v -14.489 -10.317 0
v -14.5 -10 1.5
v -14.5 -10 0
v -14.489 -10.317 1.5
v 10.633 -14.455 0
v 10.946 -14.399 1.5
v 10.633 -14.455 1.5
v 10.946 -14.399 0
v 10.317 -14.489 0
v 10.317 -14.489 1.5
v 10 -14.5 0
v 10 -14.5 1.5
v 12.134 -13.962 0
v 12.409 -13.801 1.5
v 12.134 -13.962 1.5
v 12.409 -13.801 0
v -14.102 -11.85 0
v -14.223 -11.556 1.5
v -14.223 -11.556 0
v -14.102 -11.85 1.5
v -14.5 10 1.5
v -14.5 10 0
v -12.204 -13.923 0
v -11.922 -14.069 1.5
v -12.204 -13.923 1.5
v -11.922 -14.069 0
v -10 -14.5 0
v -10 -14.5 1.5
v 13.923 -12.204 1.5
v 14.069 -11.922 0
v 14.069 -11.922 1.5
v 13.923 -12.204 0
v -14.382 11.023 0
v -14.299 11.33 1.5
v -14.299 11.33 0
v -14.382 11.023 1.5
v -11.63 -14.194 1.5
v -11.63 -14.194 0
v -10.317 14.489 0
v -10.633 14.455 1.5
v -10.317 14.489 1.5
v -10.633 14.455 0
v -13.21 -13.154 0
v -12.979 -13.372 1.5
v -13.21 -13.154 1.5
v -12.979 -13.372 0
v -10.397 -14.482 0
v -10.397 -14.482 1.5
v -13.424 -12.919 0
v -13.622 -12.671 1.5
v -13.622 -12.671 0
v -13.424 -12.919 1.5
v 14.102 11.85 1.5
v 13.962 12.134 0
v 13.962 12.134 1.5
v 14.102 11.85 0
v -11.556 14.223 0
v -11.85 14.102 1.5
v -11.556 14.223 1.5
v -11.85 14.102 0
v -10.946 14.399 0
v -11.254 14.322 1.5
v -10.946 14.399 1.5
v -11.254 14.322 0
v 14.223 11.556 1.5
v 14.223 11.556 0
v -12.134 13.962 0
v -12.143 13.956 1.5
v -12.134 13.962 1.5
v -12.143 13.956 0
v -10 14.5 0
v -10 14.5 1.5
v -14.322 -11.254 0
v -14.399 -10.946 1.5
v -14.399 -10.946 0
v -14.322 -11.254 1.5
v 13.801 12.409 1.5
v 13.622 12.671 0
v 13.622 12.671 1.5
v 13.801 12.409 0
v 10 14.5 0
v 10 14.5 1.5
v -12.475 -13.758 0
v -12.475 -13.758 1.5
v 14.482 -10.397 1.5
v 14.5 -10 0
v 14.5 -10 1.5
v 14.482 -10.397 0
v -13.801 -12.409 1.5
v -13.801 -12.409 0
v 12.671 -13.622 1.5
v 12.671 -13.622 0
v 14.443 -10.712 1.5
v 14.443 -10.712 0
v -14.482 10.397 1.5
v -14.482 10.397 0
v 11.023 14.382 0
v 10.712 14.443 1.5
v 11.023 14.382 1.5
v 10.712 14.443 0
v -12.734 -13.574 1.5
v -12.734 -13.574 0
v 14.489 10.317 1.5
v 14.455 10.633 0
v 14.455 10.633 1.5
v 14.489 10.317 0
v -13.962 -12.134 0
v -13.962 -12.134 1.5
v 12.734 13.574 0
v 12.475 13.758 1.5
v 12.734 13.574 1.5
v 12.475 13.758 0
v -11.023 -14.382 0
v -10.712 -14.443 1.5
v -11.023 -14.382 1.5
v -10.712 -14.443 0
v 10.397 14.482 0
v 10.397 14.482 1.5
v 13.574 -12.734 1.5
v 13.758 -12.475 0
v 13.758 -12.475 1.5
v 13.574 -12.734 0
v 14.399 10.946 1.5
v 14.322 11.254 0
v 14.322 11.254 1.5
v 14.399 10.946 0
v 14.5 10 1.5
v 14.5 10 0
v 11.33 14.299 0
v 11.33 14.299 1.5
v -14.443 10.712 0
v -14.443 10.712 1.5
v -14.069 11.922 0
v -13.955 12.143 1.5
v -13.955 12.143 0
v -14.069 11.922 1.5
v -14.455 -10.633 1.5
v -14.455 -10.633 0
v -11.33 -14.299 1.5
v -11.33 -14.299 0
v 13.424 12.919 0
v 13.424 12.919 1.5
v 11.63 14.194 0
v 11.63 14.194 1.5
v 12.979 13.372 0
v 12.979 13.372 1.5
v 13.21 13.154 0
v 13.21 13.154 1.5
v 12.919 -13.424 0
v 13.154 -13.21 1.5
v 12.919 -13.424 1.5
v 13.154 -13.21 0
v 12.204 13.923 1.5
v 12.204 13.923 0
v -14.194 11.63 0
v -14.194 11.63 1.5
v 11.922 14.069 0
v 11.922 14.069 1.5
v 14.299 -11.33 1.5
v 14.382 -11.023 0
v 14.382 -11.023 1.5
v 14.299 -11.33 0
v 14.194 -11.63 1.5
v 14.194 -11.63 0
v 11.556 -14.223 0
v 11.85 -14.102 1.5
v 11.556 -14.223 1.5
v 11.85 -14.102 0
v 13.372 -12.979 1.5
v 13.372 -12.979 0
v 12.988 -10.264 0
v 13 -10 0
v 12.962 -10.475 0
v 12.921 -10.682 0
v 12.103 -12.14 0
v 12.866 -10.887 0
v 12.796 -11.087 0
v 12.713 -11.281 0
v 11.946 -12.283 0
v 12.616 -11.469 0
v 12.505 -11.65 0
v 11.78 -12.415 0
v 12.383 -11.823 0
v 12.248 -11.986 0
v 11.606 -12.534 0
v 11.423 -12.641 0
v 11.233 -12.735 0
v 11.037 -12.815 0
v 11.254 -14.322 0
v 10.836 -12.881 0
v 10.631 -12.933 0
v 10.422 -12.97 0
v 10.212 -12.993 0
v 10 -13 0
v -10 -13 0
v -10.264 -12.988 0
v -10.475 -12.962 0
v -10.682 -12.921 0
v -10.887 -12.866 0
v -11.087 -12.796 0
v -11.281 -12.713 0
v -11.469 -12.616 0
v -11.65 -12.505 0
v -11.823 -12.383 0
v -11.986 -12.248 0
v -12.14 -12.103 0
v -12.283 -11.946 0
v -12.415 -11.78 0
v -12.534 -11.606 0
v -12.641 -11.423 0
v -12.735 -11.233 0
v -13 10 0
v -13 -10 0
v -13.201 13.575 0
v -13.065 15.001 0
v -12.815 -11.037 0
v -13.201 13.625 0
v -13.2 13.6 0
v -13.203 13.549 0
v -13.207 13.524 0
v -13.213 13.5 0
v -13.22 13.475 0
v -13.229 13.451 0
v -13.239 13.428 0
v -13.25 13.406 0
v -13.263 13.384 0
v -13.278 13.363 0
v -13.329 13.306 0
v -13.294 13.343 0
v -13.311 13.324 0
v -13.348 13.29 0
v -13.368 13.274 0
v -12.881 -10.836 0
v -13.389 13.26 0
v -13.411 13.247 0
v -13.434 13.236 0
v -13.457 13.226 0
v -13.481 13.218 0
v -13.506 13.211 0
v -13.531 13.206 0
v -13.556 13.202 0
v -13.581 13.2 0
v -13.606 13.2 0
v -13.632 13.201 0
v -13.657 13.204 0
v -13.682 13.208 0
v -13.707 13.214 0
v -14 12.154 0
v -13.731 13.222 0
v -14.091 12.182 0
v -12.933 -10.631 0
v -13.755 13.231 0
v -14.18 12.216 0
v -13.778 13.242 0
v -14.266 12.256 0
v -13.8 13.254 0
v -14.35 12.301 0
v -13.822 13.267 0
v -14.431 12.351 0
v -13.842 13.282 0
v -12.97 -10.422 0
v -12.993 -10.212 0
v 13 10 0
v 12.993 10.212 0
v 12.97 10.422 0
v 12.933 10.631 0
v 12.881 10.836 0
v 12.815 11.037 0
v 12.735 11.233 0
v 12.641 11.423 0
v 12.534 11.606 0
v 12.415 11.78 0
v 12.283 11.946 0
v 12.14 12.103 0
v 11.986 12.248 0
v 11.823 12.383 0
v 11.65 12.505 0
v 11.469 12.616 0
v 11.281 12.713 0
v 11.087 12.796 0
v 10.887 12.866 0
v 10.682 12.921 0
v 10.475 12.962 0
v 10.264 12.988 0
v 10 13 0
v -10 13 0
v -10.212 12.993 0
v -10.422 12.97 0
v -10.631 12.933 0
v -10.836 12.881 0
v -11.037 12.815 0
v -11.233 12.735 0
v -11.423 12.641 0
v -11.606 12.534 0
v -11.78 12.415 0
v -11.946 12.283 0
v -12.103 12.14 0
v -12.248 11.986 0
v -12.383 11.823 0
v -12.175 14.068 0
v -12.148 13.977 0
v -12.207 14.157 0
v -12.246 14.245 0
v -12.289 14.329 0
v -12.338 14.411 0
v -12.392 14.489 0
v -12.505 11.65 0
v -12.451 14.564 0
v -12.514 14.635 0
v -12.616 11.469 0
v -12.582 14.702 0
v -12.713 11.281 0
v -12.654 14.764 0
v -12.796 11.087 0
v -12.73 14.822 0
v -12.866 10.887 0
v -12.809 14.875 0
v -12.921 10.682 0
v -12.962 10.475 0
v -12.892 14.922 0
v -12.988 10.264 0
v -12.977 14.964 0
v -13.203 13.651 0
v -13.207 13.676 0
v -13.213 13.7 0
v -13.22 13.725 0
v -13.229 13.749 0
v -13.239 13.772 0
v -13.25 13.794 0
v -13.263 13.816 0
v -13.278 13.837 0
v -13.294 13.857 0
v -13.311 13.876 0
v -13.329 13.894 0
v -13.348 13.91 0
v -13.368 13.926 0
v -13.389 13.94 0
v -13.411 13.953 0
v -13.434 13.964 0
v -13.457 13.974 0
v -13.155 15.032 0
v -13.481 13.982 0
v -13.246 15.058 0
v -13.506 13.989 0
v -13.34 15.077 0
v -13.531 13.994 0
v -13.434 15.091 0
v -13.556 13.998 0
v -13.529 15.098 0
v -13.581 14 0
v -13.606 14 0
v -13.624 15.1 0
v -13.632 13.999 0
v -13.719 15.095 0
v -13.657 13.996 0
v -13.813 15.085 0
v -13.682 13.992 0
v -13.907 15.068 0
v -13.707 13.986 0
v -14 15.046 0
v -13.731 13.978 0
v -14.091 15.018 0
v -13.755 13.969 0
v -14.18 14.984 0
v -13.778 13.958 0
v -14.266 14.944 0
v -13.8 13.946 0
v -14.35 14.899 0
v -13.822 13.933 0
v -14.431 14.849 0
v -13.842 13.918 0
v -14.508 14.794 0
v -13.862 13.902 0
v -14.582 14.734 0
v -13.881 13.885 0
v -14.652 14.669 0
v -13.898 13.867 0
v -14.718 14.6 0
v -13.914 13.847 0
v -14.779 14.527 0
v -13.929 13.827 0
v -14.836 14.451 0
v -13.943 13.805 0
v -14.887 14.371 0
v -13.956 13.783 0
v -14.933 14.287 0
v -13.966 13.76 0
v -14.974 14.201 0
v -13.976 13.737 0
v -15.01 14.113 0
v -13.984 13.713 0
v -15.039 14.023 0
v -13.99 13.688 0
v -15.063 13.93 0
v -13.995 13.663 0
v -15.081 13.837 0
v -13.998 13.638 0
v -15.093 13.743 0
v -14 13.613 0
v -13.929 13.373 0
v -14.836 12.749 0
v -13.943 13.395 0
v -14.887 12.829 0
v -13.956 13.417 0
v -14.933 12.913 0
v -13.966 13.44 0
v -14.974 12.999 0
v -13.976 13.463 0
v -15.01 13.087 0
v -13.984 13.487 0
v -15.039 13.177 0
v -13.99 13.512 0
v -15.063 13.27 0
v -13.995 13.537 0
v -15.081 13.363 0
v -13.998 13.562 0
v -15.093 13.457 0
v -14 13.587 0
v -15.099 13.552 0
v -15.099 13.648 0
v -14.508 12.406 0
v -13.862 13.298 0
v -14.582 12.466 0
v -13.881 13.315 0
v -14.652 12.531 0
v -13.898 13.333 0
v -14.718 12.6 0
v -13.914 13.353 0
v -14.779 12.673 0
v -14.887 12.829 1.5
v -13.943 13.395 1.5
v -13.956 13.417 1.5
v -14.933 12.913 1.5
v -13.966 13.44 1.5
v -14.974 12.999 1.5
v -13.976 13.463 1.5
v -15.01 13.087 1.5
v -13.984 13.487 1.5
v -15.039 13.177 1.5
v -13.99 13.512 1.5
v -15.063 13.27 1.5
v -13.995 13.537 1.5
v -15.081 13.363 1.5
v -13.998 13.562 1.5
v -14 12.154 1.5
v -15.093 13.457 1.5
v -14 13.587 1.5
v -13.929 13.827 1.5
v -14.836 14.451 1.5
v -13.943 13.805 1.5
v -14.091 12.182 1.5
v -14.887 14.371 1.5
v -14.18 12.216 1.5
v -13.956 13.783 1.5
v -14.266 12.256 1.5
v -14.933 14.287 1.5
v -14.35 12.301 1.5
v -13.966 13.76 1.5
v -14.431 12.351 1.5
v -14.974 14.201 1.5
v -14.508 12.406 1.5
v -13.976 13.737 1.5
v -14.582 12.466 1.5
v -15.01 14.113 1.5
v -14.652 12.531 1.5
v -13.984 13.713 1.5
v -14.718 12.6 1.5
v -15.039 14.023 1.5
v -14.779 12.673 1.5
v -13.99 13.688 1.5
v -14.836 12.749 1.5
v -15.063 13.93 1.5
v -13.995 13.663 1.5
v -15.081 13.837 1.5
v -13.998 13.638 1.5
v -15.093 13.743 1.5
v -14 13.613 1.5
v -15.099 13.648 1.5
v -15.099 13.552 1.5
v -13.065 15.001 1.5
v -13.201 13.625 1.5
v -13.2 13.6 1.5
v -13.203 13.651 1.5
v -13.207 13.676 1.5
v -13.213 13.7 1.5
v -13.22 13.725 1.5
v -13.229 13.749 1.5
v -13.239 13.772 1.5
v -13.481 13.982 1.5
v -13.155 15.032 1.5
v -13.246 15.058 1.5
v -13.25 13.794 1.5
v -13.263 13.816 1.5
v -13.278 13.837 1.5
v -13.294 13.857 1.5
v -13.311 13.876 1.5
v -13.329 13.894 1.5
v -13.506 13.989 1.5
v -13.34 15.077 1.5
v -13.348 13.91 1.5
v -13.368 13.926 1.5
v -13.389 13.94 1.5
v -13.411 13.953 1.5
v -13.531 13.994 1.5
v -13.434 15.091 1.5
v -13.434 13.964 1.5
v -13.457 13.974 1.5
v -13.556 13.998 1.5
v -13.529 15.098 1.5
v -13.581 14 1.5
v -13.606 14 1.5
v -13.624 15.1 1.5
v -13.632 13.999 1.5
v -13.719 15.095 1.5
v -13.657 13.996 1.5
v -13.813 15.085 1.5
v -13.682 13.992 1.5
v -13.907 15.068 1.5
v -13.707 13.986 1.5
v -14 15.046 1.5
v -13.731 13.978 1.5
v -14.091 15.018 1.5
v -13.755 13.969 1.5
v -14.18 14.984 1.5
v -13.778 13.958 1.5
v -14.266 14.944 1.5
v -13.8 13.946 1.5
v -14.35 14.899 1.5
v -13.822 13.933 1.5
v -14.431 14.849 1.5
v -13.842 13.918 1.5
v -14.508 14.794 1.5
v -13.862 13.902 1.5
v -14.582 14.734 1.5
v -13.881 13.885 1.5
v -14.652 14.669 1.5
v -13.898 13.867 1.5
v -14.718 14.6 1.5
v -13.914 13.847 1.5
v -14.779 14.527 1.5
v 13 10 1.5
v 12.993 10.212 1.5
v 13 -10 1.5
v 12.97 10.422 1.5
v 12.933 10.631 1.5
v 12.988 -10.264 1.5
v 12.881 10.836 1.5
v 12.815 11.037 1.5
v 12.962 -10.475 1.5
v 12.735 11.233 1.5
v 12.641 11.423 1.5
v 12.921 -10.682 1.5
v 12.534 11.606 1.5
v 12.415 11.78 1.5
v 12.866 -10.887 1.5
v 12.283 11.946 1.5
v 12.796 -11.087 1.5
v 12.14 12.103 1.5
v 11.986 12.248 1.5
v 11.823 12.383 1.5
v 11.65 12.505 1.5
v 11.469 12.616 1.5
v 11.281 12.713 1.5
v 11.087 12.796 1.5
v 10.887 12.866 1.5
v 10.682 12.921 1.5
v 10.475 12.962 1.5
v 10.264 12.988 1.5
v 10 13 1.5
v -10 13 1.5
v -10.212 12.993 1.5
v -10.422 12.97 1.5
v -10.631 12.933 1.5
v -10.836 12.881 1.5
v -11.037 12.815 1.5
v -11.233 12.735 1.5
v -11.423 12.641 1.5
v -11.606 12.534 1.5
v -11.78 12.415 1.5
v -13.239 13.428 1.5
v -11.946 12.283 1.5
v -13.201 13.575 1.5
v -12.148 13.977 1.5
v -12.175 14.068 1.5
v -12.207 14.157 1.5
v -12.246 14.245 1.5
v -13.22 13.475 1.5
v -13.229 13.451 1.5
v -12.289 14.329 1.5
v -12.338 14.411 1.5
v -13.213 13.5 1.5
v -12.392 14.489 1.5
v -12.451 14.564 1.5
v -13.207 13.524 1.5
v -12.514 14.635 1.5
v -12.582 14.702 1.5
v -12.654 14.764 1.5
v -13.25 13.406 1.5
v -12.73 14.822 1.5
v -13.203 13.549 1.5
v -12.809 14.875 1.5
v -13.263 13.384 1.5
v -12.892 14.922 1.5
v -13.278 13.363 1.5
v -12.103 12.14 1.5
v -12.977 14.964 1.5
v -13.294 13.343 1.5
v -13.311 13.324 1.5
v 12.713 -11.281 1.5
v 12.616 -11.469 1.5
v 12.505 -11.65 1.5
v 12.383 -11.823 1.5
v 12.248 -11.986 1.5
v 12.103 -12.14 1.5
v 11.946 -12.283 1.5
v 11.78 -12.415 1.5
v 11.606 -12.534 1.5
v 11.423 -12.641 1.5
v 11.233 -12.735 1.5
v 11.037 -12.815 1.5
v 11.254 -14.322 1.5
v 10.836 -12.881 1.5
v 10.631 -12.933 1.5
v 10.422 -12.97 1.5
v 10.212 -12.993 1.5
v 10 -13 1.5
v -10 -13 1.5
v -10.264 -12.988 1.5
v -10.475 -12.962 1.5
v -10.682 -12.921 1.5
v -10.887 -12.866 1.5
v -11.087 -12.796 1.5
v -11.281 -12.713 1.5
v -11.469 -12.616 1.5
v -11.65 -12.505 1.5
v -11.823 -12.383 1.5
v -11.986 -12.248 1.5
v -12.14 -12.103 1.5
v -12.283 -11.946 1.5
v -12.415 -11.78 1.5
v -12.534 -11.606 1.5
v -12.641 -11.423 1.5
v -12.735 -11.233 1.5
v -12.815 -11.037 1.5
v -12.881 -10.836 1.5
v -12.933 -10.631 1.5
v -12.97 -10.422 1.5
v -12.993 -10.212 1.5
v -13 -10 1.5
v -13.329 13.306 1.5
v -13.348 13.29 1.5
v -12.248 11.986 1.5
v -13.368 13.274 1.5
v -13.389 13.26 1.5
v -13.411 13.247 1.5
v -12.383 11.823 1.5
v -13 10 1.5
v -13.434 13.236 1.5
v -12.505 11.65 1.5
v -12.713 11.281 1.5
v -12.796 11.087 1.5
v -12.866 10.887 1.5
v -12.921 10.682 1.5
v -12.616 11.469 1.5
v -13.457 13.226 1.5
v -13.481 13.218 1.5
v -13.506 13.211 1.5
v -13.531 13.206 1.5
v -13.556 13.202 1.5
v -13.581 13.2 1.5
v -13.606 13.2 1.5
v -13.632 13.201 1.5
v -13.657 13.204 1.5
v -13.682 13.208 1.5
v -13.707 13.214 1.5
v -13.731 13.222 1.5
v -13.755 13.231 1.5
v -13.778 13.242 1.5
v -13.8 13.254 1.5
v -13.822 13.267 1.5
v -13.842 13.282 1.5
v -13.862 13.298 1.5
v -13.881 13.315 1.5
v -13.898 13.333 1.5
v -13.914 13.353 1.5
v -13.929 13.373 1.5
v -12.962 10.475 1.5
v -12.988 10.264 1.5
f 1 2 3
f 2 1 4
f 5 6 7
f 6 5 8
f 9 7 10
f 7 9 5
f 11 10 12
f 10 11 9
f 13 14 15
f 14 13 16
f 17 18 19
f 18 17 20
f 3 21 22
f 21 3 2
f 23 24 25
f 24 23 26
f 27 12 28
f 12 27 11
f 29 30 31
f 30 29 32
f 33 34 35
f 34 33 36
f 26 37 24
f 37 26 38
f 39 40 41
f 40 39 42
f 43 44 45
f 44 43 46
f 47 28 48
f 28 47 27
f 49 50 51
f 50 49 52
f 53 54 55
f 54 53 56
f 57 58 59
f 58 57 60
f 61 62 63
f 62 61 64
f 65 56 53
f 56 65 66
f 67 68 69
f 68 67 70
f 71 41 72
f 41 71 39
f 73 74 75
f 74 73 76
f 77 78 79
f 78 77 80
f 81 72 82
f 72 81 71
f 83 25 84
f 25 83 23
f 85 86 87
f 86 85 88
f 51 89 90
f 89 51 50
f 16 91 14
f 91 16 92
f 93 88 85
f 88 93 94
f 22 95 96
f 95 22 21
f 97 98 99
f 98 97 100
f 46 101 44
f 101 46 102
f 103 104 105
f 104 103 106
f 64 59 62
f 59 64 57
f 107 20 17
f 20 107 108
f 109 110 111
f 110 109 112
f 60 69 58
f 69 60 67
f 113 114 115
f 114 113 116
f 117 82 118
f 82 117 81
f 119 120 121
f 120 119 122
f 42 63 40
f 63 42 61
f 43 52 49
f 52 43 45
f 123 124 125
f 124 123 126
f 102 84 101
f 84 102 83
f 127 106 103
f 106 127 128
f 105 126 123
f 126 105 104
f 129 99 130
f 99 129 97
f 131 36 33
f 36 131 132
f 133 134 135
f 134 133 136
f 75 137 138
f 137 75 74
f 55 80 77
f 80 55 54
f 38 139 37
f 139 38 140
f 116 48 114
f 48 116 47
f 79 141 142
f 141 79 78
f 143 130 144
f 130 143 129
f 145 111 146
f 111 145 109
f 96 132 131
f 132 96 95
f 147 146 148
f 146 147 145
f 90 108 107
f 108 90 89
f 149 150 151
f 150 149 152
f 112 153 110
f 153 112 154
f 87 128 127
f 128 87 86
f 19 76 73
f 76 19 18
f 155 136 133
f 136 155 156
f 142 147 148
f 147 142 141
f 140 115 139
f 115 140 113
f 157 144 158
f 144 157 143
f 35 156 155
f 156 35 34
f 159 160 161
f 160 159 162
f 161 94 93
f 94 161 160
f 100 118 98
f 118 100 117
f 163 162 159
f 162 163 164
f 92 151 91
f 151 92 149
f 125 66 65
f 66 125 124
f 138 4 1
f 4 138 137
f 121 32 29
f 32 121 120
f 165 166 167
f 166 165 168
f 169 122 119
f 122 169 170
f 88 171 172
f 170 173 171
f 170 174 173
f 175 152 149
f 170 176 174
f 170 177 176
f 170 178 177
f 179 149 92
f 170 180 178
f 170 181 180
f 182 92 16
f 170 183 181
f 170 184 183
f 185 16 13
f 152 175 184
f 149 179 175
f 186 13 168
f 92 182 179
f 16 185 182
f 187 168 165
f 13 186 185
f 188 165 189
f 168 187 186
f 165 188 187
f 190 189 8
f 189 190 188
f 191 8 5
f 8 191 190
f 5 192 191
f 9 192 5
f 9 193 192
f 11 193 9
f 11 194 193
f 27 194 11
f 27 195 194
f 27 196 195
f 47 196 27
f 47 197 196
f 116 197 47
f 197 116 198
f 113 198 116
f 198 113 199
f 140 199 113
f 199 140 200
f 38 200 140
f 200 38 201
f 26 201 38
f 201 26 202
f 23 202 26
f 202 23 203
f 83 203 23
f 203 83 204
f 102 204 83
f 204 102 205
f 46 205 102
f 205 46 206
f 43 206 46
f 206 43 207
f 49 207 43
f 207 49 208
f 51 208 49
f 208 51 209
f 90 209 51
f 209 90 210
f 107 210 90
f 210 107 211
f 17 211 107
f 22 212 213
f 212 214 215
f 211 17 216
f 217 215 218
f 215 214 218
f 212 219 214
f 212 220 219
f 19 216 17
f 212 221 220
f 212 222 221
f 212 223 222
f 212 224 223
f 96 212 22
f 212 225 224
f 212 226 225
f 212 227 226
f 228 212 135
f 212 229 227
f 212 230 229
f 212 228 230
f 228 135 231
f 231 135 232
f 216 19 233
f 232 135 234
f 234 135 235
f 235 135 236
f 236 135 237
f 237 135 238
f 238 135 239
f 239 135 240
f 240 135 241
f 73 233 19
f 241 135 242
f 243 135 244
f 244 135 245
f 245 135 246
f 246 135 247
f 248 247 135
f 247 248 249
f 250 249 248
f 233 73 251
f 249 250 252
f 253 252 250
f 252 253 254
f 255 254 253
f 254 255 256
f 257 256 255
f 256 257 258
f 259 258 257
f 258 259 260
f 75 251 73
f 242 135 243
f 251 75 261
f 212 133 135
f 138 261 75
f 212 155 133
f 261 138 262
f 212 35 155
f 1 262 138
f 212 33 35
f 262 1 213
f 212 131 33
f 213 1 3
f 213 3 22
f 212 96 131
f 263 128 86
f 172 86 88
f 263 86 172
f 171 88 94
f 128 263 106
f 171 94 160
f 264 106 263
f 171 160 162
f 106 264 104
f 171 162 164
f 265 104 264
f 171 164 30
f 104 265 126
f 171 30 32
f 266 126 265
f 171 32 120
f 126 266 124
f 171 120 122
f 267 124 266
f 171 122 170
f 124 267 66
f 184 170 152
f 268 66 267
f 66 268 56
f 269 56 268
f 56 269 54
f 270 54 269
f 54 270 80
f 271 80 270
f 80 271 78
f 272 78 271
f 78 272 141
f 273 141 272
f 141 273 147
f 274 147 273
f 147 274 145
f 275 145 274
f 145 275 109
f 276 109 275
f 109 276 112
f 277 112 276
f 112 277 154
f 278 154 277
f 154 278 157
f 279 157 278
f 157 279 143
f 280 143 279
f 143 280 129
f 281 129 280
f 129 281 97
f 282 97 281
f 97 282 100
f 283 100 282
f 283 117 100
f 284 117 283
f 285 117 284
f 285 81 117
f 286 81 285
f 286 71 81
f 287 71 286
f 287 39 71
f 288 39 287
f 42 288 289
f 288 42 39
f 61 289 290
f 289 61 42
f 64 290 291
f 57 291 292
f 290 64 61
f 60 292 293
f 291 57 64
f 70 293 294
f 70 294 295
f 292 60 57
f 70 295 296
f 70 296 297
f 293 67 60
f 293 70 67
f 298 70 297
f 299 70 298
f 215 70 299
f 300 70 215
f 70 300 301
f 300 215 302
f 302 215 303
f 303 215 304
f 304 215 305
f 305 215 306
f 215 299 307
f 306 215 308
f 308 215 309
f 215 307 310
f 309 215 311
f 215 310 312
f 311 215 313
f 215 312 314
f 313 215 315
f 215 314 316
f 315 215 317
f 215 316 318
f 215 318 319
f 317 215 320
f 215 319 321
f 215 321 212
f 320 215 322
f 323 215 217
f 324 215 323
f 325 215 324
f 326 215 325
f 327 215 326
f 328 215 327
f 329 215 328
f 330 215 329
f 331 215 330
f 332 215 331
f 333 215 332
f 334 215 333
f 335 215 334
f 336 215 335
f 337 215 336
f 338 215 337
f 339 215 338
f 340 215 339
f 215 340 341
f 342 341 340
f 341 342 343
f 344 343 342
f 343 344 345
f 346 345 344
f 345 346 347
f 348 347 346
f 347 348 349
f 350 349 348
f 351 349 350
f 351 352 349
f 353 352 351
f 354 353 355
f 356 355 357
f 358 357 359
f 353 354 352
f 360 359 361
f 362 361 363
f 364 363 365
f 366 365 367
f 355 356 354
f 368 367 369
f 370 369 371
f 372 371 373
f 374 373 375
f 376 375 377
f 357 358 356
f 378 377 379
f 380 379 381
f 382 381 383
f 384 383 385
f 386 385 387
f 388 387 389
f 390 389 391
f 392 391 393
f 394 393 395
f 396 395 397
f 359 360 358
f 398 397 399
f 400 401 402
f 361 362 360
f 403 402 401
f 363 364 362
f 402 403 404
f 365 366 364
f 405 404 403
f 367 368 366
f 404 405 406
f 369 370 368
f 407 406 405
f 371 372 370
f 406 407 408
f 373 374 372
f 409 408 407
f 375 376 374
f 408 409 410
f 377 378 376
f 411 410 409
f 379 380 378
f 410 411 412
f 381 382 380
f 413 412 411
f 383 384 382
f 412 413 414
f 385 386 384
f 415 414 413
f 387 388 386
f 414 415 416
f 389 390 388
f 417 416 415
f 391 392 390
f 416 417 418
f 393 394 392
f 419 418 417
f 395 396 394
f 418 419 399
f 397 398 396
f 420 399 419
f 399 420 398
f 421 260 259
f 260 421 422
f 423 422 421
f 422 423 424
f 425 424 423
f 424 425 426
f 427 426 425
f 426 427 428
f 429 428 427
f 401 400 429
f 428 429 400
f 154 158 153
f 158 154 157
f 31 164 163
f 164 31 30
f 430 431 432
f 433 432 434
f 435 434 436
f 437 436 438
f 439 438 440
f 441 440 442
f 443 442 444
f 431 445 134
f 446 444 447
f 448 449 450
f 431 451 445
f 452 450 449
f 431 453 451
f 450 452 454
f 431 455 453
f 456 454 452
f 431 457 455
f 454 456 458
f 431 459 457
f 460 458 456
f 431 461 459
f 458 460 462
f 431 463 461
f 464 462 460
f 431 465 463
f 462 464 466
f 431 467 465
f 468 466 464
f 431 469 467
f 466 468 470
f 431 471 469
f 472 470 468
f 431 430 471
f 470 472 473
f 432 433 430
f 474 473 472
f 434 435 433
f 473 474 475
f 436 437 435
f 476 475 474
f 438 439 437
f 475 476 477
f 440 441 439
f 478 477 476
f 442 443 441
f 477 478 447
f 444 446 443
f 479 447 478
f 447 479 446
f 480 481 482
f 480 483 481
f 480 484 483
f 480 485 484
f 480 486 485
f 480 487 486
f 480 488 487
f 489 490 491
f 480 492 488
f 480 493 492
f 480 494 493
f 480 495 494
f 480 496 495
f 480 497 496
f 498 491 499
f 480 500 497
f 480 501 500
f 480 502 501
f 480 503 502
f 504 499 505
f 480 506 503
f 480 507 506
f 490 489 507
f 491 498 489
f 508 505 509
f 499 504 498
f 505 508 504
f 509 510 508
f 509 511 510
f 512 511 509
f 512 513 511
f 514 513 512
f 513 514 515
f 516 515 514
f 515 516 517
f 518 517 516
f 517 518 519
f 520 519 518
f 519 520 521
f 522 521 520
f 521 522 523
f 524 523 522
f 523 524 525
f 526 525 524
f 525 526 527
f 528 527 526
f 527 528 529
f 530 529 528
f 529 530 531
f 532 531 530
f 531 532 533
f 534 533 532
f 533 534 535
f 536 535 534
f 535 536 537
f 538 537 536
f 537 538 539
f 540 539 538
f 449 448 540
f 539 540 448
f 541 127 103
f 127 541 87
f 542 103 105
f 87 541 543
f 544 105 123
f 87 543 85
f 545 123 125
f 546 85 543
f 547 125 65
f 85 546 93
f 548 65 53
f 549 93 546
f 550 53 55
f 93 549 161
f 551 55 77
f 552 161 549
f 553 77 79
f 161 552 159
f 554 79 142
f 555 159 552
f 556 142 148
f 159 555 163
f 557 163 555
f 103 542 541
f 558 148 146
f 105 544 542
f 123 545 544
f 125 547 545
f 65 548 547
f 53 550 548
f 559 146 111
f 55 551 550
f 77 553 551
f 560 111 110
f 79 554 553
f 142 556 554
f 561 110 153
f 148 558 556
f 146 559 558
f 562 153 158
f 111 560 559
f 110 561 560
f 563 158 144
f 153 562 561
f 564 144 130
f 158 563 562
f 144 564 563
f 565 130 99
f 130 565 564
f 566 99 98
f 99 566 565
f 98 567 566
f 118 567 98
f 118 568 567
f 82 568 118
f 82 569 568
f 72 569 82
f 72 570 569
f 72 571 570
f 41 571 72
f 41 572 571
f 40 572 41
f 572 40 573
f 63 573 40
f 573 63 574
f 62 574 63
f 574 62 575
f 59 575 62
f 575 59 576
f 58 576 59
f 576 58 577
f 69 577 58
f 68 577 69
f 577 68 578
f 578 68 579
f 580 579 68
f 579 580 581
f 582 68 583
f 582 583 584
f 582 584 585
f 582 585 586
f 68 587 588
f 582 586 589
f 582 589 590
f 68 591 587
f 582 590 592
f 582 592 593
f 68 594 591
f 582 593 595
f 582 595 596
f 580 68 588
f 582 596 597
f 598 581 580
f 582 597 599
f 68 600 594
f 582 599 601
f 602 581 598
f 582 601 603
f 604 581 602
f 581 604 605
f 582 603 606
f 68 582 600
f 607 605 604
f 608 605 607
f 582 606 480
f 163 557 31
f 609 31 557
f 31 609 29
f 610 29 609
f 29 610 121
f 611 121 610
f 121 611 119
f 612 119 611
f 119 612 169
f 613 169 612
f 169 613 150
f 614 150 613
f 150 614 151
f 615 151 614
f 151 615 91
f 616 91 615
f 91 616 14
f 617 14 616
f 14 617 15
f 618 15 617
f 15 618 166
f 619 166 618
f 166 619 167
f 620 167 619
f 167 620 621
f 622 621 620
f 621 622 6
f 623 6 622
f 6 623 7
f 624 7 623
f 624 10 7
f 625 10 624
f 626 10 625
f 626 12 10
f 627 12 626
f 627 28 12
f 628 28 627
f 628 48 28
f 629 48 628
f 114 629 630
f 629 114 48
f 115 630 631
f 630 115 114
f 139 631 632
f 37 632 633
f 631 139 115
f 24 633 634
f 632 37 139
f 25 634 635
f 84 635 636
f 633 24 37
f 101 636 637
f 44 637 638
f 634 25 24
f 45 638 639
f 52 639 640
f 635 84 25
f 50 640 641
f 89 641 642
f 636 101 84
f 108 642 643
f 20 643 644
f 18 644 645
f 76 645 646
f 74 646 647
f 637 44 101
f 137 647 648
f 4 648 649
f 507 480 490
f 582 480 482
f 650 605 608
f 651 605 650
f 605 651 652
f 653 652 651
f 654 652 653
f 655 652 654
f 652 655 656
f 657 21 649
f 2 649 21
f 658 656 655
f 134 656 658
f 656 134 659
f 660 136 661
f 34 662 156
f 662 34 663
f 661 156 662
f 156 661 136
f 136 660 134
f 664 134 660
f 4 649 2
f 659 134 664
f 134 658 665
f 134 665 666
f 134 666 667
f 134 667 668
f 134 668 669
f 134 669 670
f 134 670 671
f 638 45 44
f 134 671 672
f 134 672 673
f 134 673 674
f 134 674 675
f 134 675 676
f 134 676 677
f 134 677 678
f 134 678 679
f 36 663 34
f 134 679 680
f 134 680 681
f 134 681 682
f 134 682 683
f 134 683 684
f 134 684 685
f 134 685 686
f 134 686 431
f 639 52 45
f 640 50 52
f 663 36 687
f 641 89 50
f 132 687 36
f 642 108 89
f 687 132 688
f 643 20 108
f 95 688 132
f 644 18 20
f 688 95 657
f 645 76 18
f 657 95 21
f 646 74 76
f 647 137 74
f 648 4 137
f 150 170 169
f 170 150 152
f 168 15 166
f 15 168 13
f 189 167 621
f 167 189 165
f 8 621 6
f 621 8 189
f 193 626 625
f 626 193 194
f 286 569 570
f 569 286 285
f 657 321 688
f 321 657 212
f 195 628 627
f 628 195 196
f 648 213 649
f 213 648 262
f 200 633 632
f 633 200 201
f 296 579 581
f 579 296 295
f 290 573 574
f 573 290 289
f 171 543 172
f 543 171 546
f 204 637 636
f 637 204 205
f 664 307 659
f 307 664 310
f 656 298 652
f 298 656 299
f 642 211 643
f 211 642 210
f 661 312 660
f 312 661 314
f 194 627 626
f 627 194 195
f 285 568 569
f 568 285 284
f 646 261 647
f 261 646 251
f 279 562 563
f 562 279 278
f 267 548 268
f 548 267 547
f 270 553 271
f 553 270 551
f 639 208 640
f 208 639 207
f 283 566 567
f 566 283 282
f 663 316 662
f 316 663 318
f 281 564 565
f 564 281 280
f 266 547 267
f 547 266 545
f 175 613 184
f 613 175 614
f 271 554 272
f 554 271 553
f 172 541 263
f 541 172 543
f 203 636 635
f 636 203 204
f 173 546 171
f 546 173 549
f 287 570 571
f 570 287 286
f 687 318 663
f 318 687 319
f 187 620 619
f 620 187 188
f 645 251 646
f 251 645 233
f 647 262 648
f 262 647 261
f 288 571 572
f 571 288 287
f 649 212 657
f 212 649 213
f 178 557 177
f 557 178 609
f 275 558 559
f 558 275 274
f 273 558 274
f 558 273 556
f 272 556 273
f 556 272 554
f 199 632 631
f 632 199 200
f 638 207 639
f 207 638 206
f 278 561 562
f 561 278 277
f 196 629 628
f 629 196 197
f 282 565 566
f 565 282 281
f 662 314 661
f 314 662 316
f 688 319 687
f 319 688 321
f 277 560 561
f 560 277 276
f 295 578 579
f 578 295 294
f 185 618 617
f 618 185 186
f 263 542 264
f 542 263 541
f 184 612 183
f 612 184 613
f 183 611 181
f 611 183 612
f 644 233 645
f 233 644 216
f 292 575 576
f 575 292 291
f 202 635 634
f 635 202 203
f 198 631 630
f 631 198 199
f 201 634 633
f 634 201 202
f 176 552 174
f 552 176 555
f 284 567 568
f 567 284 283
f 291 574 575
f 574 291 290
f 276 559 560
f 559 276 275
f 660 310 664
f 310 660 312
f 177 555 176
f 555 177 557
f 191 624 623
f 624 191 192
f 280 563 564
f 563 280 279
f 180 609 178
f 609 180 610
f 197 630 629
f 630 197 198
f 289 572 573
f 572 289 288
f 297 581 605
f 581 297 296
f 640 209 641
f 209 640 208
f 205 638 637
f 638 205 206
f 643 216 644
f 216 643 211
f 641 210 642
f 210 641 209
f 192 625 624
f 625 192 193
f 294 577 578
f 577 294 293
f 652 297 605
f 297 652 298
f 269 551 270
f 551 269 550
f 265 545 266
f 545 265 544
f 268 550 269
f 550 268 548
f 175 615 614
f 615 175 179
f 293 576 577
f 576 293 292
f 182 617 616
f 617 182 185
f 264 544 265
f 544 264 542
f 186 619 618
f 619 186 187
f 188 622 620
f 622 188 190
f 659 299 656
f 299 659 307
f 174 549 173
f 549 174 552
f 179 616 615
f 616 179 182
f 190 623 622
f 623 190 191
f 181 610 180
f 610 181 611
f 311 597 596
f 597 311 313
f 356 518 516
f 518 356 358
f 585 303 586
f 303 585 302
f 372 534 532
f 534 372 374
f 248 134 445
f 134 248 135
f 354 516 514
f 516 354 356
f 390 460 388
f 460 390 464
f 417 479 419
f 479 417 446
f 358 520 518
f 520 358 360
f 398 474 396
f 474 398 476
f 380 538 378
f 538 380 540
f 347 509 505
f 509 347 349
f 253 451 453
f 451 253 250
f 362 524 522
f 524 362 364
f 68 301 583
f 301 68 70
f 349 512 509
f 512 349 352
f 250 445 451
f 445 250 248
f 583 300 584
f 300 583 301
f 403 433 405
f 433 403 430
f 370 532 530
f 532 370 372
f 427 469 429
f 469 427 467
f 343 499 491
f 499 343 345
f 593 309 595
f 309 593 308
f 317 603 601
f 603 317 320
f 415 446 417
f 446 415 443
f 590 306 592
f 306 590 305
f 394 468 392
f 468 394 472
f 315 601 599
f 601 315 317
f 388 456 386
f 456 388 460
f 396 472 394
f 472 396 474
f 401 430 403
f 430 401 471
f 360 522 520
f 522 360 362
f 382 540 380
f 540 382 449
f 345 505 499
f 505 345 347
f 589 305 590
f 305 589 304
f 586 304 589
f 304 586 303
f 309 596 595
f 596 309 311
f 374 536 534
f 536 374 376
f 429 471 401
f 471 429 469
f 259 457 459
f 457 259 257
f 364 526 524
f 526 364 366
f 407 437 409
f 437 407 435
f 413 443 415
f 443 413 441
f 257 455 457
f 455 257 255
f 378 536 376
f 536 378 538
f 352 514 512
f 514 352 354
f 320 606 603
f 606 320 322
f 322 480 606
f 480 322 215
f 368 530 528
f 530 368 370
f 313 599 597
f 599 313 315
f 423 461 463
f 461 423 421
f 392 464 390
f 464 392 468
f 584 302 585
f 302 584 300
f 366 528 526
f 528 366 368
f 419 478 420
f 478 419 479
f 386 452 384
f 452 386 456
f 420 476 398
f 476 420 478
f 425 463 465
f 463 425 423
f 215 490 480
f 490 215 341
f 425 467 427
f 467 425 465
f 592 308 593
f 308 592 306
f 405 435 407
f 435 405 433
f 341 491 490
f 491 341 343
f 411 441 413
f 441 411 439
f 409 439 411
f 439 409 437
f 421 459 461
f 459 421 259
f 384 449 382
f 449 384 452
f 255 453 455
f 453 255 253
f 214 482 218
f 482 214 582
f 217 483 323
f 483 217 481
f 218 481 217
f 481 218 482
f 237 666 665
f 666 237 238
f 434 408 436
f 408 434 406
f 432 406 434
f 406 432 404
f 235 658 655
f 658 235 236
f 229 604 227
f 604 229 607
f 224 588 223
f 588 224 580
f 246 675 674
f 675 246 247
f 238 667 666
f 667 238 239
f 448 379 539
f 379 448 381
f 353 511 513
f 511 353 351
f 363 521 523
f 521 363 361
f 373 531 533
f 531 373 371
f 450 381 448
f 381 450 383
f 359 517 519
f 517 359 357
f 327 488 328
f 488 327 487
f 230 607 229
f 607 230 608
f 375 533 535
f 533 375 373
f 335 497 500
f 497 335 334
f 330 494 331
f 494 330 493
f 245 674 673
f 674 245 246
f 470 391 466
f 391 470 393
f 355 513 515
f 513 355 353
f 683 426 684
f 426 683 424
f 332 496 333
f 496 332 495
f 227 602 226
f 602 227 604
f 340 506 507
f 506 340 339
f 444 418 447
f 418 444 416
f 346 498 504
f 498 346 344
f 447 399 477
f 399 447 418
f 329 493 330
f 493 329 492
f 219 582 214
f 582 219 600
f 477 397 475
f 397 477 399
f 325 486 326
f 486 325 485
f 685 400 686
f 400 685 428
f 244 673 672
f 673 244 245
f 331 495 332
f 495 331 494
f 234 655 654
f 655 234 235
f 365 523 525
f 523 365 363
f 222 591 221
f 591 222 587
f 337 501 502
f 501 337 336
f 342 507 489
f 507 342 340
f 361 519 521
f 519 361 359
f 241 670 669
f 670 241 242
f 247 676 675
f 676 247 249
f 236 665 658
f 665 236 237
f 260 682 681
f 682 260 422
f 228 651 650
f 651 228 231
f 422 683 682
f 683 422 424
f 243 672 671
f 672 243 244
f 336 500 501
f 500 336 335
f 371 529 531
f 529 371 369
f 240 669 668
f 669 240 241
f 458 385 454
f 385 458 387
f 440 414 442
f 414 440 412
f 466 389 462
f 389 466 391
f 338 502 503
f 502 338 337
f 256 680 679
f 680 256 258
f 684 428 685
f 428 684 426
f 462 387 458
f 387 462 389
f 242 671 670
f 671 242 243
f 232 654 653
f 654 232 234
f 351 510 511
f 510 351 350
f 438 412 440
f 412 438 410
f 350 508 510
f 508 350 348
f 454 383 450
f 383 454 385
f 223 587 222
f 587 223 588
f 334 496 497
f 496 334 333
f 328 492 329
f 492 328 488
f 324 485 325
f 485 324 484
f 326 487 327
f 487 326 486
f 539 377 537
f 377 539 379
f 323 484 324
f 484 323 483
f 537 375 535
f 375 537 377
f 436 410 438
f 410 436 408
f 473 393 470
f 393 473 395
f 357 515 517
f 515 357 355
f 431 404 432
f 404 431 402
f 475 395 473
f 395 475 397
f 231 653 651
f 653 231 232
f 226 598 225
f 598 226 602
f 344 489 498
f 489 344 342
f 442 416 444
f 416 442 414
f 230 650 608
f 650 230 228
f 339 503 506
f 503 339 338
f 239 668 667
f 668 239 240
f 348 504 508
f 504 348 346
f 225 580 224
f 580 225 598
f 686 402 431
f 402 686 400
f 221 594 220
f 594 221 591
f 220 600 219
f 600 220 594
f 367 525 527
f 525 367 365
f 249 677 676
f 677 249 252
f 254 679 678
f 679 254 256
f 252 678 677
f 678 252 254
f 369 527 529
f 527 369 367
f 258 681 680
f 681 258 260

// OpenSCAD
//=================================================================================
// BootStrap1.scad
//
//
// Dr Tom Flint, 30 May 2023
//=================================================================================

s0 = 20;  // side before offset
r0 = 3;   // radius of offset
t0 = 10;   // size of text
z0 = 1.5; // thickness

//----------------------------------------------------------------------------------
module bsBack(){
  
  difference(){
    linear_extrude(height = z0)
    offset(r=r0,$fn=89)
    square([s0,s0],center=true);
    
    translate([0,0,-1])
    scale([1,1.8,1])
    linear_extrude(height = z0+2)
    text("BS", font = "Open Sans:style=Bold", size=t0,halign="center",valign="center",spacing=1.1);
  }
}

//----------------------------------------------------------------------------------
module bsRim(){
  difference(){
    linear_extrude(height = z0)
    offset(r=1.5*r0,$fn=89)
    square([s0,s0],center=true);

    linear_extrude(height = z0)
    offset(r=r0,$fn=89)
    square([s0,s0],center=true);
  }
}


//----------------------------------------------------------------------------------
module bsRim2(){
  difference(){
    linear_extrude(height = z0)
    offset(r=1.5*r0,$fn=89)
    square([s0,s0],center=true);

    linear_extrude(height = z0)
    offset(r=r0,$fn=89)
    square([s0,s0],center=true);
  }

  translate([-s0/2-1.2*r0,s0/2+1.2*r0,0])
  difference(){
    cylinder(r=r0/2,h=z0,$fn=99);
    cylinder(r=0.4,h=5*z0,center=true,$fn=99);
  }

}

//----------------------------------------------------------------------------------
module bsText(){
    
    scale([1,1.8,1])
    linear_extrude(height = z0)
    text("BS", font = "Open Sans:style=Bold", size=t0,halign="center",valign="center",spacing=1.1);

}
//==================================================================================

//bsBack();
//bsRim();
//bsText();
bsRim2();

//==================================================================================
